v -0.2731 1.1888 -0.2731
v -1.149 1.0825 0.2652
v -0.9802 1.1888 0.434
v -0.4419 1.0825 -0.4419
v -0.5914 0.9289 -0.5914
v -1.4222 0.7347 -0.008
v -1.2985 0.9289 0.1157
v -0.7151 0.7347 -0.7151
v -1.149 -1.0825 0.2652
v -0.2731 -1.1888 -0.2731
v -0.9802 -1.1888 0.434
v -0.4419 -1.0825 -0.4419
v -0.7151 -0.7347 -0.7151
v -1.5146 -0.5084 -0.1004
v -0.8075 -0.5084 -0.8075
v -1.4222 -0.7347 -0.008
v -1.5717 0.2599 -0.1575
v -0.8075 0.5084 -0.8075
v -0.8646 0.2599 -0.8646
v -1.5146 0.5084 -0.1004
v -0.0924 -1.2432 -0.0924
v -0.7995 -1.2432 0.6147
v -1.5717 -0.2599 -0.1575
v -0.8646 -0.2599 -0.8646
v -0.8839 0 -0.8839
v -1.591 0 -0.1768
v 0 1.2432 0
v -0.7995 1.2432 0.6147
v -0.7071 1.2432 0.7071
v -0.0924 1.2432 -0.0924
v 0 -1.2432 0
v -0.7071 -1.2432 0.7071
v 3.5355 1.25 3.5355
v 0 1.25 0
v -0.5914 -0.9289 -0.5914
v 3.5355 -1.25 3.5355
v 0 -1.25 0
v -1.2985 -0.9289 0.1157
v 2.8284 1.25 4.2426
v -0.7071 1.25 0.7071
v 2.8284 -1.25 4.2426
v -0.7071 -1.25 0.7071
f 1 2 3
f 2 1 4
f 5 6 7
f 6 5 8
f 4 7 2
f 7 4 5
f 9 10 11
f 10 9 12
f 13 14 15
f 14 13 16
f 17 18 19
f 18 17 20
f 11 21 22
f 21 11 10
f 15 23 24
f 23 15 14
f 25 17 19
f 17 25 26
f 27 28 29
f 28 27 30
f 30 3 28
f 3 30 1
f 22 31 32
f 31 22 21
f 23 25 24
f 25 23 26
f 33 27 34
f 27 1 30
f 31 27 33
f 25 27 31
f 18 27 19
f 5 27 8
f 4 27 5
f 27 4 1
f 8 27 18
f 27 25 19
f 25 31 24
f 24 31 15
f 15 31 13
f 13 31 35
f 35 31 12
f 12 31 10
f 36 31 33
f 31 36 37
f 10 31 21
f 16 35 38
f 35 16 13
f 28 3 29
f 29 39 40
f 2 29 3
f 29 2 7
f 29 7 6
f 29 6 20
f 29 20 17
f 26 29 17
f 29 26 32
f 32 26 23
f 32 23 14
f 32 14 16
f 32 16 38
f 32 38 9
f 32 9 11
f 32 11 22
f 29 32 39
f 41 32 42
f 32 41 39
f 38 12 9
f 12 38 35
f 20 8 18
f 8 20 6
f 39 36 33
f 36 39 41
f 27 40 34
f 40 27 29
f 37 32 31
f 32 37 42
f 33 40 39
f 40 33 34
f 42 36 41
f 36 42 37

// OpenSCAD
$fn =30;
module peghole(){
    color("Blue")cylinder (6, .8, .8, true);
}
// the peg hole template, a change in size here changes hole everywhere
module peg(){
    cylinder (6, .8, .8, true);
}

module edge(){
cylinder (5, 3.25, 3.25, true);
}
// a cylinder for making block


module block(){
    intersection(){
edge();
rotate([90,0,0]) edge();
rotate([0, 90, 0]) edge();
}
}
// create the base cube without the holes


module blox(){
difference(){ 
block();
   peghole();
rotate ([90, 0, 0]) peghole();
rotate ([0, 90, 0]) peghole();
}
}
//unembeleshed blox cube

module cross(){
blox();
translate([5,0,0]) blox();
translate([-5,0,0]) blox();
translate([0,0,5]) blox();
translate([0,0,-5]) blox();
}
// central blox cross

module corner(){difference(){
    block();
   translate([-3,-3,3])rotate([0,45,0])
cube([8,6
   ,4]) color("Red");
 rotate([0,90,0])
   translate([0,0,-4]) peghole();
 translate([0,0,-4]) peghole();   
 rotate([0,45,0]) translate([0,0,1])peghole();   
}
}
    
//anled blox piece

module side(){
    blox();
    translate([0,0,5])corner();
translate([0,0,-5]) rotate([0,90,0]) corner();
}
// Pentagram side of octagon, can be own piece

module 3long() {
    blox();
    translate([0,0,5]) blox();
    translate([0,0,-5]) blox();
}

module opcorner(){
    translate([5,0,5]) corner();
translate([-5,0,-5]) rotate([0,180,0])corner();
}
// unused now

module oct() {
3long();
translate([5,0,0]) side();
translate([-5,0,0]) rotate([0,180,0]) side();
}
// one octagon of blox, can be used as own piece

module longside() {
side();
translate([0,5,0]) side();
translate([0,-5,0]) side();
}
// long side can be used as own piece

module hexlong(){
longside();
translate([-5,0,0]) rotate([0,180,0]) longside();
}
// long side in the combined form, usable as piece

module 3X3() {
3long();
translate([0,5,0]) 3long();
translate([0,-5,0]) 3long();
}
// plate of 3X3 blox can be used as own piece

module long(){
    oct();
translate([0,5,0]) oct();
translate([0,-5,0]) oct();
}
// octoganal tube with solid fill

module longhollow(){
difference(){
long();
cube([10,10,5], true);
cube([5,10,10], true);
}
}
// lighter octoganal tube

module test(){
translate([0,0,10]) blox();
rotate([0,45,0]) translate([0,0,9.5]) blox();
}
// set up angle for bracket design
module core() {
    color("Red") translate([0,0,2.5]) blox();
    color("Red");
}
//core();
module caplower(){
CapPoints = [ [0,7.5,0],[5,2.5,0],[5,-2.5,0],[0,-7.5,0],[0,2.35,4.6],[2.35,2.35,4.6],[2.35,-2.35,4.6],[0,-2.35,4.6] ];
CapFaces = [ [0,1,2,3],[1,0,5],[3,2,6],[3,6,7],[3,7,4,0],[2,1,5,6],[5,4,7,6],[4,5,0] ];
polyhedron(CapPoints, CapFaces,convexity = 1);
}
// creates a cap with a petruding blox, needs finetuning
module halfflatcap() {
    CapPoints = [ [0,7.5,0],[5,2.5,0],[5,-2.5,0],[0,-7.5,0],[0,2.5,5],[2.5,2.5,5],[2.5,-2.5,5],[0,-2.5,5] ];
CapFaces = [ [3,2,1,0],[5,0,1],[6,2,3],[7,6,3],[0,4,7,3],[6,5,1,2],[6,7,4,5],[0,5,4] ];
difference(){
    polyhedron(CapPoints, CapFaces,convexity = 1);
translate([2.5,0,-1]) peghole();
translate([0,0,4]) peghole();
}
}
// make half a cao for hex with sides flush with top of blox
module fulflatcap() {
    halfflatcap();
rotate ([0,0,180]) halfflatcap();
}

// make cap for hex with sides flush with top of blox
//no holes yet

module bracketbase(){
    difference(){
rotate([0,30,0])translate([1,0,-1]) cube([5,3,5], true);
translate([-2.5,0,-10]) test();
 translate([-4,-3,-3])cube([3,5,5]);translate([-.5,0,-4.5])rotate([0,30,0]) cube(4.1, true);translate([-4,-2,-5])cube(4);    
  }
}
// bracket for between wings

module prism() {
    polyhedron(
               points=[[0,0,0], [5,0,0], [5,5,0], [0,5,0], [0,5,5], [5,5,5]],
               faces=[[0,1,2,3],[5,4,3,2],[0,4,5,1],[0,3,4],[5,2,1]]
               );
}
module edgeshape(){
    cube(5);
    translate([0,-5,0]) prism();
    translate ([0,5,5]) rotate ([-90,0,0]) prism();
}
//translate([0,0,3]) blox();
module bracketend(){
cylinder(1,1.25,1.25);
translate([0,-1.25,0]) cube([5,2.5,1]);
}
rotate ([0,-45,0]) bracketend();
